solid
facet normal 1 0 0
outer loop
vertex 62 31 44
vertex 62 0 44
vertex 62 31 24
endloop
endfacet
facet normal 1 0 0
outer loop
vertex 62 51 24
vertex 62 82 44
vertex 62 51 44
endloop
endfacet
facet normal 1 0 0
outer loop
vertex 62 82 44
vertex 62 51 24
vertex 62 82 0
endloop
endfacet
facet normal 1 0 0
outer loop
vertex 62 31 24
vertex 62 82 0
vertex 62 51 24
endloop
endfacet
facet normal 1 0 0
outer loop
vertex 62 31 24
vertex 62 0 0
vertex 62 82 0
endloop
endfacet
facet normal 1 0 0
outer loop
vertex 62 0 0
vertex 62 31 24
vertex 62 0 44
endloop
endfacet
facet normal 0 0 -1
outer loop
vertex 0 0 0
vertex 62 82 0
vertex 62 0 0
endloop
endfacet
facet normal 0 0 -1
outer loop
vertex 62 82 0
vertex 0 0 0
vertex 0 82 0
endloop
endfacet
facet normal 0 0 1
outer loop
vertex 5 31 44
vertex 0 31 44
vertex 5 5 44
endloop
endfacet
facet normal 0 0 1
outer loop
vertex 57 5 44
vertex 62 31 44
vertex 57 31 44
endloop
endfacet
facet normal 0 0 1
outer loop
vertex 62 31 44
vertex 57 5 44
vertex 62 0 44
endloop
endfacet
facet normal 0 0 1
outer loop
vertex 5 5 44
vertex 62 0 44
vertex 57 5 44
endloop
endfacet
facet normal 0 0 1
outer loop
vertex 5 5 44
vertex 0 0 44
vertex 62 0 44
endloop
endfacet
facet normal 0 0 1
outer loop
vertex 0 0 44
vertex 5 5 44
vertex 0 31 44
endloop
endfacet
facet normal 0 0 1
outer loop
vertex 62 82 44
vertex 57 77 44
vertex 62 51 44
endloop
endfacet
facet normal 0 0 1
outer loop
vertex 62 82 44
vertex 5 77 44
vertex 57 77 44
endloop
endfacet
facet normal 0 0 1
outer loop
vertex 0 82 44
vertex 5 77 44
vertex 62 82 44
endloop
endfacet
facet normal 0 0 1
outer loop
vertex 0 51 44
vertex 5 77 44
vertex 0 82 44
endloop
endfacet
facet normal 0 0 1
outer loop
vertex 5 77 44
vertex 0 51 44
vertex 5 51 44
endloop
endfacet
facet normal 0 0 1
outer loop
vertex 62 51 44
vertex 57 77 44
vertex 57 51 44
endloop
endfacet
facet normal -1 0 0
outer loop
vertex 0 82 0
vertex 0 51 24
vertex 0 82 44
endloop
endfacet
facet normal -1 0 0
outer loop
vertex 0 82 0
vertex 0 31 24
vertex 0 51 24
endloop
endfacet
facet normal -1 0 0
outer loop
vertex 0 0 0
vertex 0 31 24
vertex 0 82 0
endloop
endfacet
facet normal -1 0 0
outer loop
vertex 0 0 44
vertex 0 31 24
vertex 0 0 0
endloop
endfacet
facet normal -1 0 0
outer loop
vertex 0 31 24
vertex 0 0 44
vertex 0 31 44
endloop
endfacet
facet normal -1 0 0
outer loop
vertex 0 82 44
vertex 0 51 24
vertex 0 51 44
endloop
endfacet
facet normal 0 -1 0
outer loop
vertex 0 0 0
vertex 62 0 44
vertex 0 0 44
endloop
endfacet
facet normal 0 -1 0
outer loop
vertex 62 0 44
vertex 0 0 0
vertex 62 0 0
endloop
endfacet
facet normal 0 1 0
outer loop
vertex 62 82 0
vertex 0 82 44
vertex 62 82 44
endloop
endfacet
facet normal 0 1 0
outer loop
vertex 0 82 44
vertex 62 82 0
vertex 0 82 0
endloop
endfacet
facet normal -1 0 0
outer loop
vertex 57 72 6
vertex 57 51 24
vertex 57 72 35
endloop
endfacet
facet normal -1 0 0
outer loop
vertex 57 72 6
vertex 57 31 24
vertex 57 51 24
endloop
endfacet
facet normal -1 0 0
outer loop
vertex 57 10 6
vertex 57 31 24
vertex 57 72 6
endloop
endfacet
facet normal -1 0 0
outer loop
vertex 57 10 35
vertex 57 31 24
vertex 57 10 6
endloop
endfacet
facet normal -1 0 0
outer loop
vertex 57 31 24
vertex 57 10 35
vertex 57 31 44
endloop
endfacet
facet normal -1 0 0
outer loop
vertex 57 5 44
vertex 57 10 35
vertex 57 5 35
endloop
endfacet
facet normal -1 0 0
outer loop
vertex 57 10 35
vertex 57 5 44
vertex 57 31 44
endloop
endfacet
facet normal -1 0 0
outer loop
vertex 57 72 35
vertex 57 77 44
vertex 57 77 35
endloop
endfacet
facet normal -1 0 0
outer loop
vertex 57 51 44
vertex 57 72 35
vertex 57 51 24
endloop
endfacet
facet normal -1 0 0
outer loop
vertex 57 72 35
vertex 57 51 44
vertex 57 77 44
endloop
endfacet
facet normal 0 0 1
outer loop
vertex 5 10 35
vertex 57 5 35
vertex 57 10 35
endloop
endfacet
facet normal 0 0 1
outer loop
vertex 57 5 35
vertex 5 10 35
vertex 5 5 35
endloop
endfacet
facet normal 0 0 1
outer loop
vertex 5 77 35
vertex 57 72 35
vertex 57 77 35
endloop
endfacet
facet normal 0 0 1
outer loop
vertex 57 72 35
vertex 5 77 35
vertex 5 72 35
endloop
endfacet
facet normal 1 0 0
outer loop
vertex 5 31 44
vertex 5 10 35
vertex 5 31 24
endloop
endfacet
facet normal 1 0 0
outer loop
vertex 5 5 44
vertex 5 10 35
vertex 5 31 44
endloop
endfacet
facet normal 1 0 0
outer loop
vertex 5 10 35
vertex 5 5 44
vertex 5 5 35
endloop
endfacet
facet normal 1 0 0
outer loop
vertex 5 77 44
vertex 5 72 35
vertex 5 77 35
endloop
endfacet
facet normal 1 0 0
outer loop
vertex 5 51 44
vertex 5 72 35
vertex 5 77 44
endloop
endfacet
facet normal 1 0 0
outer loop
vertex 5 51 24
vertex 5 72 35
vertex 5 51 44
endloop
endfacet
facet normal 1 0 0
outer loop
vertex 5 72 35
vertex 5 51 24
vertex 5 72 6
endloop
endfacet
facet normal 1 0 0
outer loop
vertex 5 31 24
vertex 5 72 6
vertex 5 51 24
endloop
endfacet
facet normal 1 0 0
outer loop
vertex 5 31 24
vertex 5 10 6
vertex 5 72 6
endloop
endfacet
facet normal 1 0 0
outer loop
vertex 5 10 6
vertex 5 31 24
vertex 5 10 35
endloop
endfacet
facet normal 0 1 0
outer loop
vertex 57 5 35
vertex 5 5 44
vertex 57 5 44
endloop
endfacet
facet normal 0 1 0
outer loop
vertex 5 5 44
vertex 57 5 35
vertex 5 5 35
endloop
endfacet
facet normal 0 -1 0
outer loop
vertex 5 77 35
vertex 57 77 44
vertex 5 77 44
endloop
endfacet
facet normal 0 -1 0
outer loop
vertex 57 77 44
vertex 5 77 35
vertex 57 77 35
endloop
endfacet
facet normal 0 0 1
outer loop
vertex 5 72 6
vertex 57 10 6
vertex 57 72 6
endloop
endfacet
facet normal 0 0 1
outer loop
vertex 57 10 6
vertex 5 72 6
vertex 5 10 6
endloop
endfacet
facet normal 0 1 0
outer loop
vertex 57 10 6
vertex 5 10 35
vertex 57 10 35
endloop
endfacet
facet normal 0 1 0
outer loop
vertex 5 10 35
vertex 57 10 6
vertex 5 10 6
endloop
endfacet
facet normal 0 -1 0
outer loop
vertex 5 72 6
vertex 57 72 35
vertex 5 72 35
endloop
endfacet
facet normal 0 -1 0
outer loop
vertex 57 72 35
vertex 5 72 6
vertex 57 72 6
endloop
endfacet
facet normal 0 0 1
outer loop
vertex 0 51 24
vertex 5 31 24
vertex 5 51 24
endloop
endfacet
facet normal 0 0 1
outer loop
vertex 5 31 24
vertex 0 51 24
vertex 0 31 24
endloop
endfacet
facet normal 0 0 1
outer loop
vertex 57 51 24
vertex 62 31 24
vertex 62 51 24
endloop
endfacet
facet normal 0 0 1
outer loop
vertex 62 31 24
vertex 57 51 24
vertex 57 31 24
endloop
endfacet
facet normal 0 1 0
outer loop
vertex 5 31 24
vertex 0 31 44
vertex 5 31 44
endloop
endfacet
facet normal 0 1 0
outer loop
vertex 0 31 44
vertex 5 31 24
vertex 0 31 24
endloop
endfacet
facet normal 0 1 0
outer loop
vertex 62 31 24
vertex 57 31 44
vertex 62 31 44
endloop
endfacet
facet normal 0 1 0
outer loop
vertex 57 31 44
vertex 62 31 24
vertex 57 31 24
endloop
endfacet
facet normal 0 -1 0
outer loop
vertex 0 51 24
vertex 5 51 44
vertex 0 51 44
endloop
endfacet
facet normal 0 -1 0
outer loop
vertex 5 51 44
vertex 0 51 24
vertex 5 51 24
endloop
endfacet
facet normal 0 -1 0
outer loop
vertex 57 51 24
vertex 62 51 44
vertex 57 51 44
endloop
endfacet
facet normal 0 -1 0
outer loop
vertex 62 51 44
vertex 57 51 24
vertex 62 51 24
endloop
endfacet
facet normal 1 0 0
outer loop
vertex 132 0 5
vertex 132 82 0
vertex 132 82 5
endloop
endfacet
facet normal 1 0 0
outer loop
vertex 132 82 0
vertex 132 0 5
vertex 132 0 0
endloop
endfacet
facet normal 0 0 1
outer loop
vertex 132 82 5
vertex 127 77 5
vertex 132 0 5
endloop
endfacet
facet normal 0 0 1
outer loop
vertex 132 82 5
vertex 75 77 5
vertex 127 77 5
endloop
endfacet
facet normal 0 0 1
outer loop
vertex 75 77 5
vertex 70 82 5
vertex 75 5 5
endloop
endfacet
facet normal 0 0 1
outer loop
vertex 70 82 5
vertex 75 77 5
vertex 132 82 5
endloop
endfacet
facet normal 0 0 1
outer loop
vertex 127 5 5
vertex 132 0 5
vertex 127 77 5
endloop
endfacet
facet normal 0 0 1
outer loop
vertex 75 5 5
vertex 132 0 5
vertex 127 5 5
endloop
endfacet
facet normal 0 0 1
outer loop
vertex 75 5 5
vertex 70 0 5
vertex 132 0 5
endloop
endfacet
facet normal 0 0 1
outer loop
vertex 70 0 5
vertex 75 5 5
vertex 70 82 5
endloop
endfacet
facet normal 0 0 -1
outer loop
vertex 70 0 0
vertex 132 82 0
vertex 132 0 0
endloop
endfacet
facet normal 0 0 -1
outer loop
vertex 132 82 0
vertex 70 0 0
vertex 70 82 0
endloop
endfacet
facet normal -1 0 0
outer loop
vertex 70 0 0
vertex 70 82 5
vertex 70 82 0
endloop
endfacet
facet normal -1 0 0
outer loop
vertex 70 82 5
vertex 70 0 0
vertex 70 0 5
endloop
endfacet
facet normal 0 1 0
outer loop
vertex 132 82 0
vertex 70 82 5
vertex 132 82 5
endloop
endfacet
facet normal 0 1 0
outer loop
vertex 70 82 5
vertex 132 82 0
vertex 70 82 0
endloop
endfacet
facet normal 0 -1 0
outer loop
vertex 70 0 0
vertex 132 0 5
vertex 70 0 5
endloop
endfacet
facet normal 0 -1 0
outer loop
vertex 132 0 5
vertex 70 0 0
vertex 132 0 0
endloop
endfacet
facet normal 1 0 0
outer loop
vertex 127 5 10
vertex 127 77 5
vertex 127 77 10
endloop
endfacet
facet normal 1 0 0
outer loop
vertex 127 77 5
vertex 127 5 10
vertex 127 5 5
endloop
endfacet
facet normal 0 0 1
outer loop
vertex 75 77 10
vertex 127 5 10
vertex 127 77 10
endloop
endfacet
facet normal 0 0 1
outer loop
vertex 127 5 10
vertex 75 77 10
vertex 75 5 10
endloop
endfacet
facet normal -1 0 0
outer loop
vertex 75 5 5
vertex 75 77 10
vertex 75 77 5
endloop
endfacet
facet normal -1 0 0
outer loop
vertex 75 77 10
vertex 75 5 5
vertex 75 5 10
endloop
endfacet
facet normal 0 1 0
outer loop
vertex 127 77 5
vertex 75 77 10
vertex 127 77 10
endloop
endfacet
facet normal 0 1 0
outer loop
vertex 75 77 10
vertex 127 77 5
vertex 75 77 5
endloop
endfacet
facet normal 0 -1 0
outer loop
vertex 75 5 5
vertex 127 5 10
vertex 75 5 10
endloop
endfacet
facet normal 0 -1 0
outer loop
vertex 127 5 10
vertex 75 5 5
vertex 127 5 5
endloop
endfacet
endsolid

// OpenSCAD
module enclosure(width, length, height, wall, recess, lip, cap, hole){
     mainW = width + 2*wall;
     mainL = length + 2*wall;
     mainH = height +wall+recess+cap;
     difference(){
	  cube([mainW, mainL, mainH]);
	  translate([wall,wall, -1]){
	       cube([width,length, height+1+cap]);
	  }
	  translate([wall, wall+lip,height+cap-1]){
	       cube([width, length-2*(lip), recess]);
	  }
	  translate([-1,(mainL/2)-(hole/2),-1]){
	       cube([2+mainW,hole, hole+1]);
	  }
     }
}
module enclosureLid(width, length, wall, cap){
     cube([width+2*wall, length + 2*wall, wall]);
     translate([wall,wall,wall]){
	  cube([width, length, cap]);
     }
}
translate([0,82,44]){
     rotate([180,0,0]){
	  enclosure(width = 52,length = 72, height = 4, wall = 5, recess = 30, lip = 5, cap = 5, hole = 20);
     }
}
translate([70,0,0]){
     enclosureLid(width = 52, length = 72, wall = 5, cap = 5);
}
